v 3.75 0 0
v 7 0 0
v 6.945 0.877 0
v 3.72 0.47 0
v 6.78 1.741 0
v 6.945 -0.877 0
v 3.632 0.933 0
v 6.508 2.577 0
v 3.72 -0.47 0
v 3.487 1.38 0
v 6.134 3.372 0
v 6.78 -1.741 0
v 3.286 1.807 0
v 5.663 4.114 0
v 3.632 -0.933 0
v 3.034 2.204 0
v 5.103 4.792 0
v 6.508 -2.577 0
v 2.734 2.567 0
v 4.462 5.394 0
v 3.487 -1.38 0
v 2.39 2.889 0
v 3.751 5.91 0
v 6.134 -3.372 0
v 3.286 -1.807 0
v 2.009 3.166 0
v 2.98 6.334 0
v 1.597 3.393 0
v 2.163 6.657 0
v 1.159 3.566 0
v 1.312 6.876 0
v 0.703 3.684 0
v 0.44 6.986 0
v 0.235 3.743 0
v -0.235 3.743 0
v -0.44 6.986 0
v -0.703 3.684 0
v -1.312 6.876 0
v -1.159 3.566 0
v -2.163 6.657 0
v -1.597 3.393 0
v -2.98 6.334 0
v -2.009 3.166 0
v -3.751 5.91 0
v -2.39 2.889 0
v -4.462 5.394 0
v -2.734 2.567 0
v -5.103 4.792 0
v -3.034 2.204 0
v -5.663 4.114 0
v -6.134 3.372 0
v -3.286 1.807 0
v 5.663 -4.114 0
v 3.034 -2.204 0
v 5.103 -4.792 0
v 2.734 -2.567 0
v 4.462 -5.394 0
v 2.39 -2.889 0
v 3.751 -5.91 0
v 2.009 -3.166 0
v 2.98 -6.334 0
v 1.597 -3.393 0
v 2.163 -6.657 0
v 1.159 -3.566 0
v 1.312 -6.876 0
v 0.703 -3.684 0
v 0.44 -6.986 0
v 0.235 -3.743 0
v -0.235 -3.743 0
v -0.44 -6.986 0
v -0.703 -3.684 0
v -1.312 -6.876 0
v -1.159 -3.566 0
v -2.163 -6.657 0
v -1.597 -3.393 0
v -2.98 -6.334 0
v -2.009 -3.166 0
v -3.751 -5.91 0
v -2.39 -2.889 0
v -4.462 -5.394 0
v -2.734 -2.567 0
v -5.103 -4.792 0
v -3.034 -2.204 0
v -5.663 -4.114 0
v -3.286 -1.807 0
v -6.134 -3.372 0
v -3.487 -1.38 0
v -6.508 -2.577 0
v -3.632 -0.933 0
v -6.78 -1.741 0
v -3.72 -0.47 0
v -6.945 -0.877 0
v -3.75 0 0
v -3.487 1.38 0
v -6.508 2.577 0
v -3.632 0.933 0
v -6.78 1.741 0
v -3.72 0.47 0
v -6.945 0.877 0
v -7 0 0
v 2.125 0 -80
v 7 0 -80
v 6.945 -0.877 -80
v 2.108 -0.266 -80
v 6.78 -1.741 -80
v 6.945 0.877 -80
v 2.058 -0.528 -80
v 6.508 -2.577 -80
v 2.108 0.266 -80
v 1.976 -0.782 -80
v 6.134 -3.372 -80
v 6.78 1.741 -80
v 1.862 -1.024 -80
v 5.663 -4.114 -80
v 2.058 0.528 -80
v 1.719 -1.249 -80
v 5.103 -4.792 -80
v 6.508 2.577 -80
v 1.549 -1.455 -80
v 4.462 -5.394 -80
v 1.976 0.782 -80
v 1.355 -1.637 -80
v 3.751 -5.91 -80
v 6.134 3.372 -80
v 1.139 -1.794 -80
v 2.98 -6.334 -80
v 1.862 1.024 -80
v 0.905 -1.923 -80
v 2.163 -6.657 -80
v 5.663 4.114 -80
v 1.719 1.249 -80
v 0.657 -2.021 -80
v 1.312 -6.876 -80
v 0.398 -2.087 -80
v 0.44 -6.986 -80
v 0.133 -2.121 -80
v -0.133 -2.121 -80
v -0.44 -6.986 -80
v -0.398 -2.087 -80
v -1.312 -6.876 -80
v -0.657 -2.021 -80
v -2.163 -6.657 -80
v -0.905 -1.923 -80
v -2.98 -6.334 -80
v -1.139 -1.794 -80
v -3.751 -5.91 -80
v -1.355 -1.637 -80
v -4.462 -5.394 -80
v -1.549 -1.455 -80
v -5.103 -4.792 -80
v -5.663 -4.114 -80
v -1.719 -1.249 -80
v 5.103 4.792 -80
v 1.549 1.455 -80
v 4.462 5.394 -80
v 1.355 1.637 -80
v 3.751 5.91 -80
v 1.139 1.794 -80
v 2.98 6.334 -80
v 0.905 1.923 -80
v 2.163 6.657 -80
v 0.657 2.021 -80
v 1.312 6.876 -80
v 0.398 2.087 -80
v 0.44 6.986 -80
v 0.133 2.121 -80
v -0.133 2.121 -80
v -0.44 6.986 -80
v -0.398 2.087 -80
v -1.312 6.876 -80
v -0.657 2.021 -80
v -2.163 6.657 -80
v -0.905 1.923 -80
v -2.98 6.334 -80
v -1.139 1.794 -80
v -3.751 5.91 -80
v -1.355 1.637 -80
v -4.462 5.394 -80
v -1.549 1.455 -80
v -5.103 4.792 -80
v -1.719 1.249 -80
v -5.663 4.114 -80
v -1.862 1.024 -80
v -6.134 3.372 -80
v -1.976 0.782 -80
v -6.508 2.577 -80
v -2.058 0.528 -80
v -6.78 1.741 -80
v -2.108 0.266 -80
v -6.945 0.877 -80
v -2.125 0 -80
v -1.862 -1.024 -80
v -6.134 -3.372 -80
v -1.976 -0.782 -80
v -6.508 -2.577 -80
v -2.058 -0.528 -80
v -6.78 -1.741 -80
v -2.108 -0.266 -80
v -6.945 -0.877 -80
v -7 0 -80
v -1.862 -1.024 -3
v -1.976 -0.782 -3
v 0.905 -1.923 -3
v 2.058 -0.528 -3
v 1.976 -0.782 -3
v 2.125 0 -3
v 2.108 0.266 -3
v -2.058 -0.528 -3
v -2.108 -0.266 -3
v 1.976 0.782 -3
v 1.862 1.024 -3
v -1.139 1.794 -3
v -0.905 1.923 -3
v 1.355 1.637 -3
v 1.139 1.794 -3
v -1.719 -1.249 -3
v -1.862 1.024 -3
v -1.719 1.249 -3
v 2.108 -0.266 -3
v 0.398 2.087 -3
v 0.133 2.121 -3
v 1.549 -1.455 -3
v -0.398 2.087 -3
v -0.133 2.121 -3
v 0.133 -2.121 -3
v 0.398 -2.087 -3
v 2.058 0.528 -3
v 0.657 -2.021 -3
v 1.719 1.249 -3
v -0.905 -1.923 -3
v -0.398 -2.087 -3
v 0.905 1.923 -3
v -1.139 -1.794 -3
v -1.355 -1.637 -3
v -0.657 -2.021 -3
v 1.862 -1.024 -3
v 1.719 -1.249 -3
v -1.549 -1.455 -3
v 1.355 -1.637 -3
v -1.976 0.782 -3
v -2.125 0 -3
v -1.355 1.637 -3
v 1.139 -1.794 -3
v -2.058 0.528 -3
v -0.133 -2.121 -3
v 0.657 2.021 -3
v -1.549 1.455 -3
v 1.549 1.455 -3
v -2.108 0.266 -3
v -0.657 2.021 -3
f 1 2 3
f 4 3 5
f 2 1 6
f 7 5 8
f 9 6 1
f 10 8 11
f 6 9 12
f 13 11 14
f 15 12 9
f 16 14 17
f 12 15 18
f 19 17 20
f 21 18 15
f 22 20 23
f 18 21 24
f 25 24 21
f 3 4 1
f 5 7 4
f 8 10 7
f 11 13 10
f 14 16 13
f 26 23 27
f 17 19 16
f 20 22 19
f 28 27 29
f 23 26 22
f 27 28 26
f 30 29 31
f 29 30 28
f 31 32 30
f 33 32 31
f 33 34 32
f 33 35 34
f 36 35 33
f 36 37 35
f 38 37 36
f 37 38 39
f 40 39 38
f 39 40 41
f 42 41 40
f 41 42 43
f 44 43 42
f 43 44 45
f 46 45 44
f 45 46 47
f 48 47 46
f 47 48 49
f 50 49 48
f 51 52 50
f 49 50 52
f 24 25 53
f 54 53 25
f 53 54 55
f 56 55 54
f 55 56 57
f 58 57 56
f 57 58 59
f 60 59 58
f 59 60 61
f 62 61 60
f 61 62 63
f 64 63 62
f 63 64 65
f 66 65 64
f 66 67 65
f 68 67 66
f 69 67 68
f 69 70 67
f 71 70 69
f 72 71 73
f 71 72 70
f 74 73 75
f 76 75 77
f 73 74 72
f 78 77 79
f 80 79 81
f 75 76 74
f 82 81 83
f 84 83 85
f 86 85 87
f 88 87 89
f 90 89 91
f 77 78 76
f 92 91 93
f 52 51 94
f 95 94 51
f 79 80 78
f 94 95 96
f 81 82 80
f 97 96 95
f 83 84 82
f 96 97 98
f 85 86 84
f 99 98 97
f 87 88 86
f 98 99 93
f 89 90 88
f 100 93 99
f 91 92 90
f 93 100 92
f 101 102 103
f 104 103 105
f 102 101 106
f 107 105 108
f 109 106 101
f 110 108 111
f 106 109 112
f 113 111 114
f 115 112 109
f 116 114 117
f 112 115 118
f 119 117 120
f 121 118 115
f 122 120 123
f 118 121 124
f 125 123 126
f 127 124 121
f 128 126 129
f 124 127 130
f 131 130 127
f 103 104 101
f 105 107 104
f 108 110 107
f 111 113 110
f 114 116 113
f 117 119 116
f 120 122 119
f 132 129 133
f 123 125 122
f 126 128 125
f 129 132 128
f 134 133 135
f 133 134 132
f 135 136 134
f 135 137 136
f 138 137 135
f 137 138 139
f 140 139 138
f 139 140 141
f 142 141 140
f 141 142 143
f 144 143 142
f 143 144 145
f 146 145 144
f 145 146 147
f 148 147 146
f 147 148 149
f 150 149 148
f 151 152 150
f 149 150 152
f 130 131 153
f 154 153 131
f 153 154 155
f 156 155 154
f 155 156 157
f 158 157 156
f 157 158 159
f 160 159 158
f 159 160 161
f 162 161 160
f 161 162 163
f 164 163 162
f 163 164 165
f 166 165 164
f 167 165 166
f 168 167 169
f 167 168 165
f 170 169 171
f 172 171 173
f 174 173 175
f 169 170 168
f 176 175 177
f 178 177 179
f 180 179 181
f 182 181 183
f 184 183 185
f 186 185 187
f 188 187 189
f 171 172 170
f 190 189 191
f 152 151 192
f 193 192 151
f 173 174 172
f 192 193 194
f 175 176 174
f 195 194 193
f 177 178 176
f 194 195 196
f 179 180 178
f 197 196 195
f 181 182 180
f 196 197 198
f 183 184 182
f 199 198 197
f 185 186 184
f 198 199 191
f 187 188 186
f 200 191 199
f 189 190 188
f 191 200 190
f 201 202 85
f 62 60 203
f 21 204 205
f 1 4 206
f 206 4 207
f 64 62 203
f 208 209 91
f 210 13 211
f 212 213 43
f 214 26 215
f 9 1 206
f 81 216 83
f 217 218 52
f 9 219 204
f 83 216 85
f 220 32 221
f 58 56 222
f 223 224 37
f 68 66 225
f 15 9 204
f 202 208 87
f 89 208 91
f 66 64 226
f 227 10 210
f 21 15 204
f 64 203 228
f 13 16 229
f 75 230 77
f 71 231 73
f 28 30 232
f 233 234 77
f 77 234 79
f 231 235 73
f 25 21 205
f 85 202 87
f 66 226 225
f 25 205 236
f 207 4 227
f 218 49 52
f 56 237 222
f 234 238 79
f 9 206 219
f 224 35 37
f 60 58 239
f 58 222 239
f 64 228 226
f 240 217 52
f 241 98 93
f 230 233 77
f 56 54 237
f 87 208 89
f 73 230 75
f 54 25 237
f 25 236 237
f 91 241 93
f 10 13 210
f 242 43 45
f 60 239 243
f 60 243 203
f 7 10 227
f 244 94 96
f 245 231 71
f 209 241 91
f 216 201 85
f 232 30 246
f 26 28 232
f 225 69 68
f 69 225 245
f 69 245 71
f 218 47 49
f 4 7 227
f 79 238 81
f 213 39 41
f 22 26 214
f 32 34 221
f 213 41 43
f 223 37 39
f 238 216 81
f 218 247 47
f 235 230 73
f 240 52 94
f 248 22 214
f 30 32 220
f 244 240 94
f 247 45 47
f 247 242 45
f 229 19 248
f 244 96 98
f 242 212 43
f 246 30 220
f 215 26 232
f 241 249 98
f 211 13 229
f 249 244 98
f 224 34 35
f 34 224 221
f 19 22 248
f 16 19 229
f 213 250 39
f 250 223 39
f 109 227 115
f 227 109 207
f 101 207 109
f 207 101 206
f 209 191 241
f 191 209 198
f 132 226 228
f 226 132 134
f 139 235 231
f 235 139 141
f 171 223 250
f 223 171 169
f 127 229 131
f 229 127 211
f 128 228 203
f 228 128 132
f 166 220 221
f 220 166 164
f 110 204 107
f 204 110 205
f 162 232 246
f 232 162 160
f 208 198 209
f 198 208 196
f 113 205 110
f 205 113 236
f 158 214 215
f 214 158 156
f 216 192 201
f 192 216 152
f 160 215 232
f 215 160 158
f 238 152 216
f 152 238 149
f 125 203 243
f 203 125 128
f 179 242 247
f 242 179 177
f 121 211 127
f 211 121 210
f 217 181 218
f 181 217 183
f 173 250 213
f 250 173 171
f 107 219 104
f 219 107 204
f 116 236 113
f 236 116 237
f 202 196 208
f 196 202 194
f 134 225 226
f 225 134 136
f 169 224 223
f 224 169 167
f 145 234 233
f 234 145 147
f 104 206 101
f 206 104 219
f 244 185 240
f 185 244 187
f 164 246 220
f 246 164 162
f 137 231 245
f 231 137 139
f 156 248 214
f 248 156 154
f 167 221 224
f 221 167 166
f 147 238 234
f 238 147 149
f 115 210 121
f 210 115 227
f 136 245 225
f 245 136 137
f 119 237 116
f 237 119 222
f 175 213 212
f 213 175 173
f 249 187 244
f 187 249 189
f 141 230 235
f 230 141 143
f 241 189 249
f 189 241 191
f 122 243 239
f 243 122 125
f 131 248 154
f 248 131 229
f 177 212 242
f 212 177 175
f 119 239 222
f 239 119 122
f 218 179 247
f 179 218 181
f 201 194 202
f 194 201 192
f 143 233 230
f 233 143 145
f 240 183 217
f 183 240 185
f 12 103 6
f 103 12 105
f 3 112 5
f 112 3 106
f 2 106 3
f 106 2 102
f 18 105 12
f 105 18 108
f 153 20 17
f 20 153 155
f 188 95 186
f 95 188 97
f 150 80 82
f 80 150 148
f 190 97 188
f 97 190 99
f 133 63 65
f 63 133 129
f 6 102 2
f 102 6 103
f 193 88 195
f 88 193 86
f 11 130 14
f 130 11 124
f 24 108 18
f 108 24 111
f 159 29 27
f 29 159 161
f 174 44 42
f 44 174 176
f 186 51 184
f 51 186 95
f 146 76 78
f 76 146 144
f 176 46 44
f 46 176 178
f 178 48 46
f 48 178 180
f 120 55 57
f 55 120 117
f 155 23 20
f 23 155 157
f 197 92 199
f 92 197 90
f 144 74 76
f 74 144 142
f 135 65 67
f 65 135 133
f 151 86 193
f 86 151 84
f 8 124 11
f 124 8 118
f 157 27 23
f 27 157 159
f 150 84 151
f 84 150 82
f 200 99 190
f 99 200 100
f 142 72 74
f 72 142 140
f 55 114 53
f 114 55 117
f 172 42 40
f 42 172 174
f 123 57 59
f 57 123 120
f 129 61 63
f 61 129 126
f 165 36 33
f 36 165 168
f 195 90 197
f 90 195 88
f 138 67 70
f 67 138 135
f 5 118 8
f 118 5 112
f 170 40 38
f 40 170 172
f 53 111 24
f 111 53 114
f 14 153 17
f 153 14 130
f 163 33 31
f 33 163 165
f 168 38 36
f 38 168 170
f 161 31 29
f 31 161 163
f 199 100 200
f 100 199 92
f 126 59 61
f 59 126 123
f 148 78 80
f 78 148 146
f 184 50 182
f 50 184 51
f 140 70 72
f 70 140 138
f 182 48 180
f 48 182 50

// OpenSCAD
$fn = 50;


difference() {
	union() {
		translate(v = [0, 0, -80.0000000000]) {
			cylinder(h = 80, r = 7.0000000000);
		}
	}
	union() {
		translate(v = [0, 0, 0]) {
			rotate(a = [0, 0, 0]) {
				difference() {
					union() {
						#translate(v = [0, 0, -80.0000000000]) {
							cylinder(h = 80, r = 2.0000000000);
						}
						#translate(v = [0, 0, -3]) {
							cylinder(h = 3, r1 = 2.1250000000, r2 = 3.7500000000);
						}
						#translate(v = [0, 0, -80.0000000000]) {
							cylinder(h = 80, r = 2.1250000000);
						}
						#translate(v = [0, 0, -80.0000000000]) {
							cylinder(h = 80, r = 2.0000000000);
						}
					}
					union();
				}
			}
		}
	}
}
